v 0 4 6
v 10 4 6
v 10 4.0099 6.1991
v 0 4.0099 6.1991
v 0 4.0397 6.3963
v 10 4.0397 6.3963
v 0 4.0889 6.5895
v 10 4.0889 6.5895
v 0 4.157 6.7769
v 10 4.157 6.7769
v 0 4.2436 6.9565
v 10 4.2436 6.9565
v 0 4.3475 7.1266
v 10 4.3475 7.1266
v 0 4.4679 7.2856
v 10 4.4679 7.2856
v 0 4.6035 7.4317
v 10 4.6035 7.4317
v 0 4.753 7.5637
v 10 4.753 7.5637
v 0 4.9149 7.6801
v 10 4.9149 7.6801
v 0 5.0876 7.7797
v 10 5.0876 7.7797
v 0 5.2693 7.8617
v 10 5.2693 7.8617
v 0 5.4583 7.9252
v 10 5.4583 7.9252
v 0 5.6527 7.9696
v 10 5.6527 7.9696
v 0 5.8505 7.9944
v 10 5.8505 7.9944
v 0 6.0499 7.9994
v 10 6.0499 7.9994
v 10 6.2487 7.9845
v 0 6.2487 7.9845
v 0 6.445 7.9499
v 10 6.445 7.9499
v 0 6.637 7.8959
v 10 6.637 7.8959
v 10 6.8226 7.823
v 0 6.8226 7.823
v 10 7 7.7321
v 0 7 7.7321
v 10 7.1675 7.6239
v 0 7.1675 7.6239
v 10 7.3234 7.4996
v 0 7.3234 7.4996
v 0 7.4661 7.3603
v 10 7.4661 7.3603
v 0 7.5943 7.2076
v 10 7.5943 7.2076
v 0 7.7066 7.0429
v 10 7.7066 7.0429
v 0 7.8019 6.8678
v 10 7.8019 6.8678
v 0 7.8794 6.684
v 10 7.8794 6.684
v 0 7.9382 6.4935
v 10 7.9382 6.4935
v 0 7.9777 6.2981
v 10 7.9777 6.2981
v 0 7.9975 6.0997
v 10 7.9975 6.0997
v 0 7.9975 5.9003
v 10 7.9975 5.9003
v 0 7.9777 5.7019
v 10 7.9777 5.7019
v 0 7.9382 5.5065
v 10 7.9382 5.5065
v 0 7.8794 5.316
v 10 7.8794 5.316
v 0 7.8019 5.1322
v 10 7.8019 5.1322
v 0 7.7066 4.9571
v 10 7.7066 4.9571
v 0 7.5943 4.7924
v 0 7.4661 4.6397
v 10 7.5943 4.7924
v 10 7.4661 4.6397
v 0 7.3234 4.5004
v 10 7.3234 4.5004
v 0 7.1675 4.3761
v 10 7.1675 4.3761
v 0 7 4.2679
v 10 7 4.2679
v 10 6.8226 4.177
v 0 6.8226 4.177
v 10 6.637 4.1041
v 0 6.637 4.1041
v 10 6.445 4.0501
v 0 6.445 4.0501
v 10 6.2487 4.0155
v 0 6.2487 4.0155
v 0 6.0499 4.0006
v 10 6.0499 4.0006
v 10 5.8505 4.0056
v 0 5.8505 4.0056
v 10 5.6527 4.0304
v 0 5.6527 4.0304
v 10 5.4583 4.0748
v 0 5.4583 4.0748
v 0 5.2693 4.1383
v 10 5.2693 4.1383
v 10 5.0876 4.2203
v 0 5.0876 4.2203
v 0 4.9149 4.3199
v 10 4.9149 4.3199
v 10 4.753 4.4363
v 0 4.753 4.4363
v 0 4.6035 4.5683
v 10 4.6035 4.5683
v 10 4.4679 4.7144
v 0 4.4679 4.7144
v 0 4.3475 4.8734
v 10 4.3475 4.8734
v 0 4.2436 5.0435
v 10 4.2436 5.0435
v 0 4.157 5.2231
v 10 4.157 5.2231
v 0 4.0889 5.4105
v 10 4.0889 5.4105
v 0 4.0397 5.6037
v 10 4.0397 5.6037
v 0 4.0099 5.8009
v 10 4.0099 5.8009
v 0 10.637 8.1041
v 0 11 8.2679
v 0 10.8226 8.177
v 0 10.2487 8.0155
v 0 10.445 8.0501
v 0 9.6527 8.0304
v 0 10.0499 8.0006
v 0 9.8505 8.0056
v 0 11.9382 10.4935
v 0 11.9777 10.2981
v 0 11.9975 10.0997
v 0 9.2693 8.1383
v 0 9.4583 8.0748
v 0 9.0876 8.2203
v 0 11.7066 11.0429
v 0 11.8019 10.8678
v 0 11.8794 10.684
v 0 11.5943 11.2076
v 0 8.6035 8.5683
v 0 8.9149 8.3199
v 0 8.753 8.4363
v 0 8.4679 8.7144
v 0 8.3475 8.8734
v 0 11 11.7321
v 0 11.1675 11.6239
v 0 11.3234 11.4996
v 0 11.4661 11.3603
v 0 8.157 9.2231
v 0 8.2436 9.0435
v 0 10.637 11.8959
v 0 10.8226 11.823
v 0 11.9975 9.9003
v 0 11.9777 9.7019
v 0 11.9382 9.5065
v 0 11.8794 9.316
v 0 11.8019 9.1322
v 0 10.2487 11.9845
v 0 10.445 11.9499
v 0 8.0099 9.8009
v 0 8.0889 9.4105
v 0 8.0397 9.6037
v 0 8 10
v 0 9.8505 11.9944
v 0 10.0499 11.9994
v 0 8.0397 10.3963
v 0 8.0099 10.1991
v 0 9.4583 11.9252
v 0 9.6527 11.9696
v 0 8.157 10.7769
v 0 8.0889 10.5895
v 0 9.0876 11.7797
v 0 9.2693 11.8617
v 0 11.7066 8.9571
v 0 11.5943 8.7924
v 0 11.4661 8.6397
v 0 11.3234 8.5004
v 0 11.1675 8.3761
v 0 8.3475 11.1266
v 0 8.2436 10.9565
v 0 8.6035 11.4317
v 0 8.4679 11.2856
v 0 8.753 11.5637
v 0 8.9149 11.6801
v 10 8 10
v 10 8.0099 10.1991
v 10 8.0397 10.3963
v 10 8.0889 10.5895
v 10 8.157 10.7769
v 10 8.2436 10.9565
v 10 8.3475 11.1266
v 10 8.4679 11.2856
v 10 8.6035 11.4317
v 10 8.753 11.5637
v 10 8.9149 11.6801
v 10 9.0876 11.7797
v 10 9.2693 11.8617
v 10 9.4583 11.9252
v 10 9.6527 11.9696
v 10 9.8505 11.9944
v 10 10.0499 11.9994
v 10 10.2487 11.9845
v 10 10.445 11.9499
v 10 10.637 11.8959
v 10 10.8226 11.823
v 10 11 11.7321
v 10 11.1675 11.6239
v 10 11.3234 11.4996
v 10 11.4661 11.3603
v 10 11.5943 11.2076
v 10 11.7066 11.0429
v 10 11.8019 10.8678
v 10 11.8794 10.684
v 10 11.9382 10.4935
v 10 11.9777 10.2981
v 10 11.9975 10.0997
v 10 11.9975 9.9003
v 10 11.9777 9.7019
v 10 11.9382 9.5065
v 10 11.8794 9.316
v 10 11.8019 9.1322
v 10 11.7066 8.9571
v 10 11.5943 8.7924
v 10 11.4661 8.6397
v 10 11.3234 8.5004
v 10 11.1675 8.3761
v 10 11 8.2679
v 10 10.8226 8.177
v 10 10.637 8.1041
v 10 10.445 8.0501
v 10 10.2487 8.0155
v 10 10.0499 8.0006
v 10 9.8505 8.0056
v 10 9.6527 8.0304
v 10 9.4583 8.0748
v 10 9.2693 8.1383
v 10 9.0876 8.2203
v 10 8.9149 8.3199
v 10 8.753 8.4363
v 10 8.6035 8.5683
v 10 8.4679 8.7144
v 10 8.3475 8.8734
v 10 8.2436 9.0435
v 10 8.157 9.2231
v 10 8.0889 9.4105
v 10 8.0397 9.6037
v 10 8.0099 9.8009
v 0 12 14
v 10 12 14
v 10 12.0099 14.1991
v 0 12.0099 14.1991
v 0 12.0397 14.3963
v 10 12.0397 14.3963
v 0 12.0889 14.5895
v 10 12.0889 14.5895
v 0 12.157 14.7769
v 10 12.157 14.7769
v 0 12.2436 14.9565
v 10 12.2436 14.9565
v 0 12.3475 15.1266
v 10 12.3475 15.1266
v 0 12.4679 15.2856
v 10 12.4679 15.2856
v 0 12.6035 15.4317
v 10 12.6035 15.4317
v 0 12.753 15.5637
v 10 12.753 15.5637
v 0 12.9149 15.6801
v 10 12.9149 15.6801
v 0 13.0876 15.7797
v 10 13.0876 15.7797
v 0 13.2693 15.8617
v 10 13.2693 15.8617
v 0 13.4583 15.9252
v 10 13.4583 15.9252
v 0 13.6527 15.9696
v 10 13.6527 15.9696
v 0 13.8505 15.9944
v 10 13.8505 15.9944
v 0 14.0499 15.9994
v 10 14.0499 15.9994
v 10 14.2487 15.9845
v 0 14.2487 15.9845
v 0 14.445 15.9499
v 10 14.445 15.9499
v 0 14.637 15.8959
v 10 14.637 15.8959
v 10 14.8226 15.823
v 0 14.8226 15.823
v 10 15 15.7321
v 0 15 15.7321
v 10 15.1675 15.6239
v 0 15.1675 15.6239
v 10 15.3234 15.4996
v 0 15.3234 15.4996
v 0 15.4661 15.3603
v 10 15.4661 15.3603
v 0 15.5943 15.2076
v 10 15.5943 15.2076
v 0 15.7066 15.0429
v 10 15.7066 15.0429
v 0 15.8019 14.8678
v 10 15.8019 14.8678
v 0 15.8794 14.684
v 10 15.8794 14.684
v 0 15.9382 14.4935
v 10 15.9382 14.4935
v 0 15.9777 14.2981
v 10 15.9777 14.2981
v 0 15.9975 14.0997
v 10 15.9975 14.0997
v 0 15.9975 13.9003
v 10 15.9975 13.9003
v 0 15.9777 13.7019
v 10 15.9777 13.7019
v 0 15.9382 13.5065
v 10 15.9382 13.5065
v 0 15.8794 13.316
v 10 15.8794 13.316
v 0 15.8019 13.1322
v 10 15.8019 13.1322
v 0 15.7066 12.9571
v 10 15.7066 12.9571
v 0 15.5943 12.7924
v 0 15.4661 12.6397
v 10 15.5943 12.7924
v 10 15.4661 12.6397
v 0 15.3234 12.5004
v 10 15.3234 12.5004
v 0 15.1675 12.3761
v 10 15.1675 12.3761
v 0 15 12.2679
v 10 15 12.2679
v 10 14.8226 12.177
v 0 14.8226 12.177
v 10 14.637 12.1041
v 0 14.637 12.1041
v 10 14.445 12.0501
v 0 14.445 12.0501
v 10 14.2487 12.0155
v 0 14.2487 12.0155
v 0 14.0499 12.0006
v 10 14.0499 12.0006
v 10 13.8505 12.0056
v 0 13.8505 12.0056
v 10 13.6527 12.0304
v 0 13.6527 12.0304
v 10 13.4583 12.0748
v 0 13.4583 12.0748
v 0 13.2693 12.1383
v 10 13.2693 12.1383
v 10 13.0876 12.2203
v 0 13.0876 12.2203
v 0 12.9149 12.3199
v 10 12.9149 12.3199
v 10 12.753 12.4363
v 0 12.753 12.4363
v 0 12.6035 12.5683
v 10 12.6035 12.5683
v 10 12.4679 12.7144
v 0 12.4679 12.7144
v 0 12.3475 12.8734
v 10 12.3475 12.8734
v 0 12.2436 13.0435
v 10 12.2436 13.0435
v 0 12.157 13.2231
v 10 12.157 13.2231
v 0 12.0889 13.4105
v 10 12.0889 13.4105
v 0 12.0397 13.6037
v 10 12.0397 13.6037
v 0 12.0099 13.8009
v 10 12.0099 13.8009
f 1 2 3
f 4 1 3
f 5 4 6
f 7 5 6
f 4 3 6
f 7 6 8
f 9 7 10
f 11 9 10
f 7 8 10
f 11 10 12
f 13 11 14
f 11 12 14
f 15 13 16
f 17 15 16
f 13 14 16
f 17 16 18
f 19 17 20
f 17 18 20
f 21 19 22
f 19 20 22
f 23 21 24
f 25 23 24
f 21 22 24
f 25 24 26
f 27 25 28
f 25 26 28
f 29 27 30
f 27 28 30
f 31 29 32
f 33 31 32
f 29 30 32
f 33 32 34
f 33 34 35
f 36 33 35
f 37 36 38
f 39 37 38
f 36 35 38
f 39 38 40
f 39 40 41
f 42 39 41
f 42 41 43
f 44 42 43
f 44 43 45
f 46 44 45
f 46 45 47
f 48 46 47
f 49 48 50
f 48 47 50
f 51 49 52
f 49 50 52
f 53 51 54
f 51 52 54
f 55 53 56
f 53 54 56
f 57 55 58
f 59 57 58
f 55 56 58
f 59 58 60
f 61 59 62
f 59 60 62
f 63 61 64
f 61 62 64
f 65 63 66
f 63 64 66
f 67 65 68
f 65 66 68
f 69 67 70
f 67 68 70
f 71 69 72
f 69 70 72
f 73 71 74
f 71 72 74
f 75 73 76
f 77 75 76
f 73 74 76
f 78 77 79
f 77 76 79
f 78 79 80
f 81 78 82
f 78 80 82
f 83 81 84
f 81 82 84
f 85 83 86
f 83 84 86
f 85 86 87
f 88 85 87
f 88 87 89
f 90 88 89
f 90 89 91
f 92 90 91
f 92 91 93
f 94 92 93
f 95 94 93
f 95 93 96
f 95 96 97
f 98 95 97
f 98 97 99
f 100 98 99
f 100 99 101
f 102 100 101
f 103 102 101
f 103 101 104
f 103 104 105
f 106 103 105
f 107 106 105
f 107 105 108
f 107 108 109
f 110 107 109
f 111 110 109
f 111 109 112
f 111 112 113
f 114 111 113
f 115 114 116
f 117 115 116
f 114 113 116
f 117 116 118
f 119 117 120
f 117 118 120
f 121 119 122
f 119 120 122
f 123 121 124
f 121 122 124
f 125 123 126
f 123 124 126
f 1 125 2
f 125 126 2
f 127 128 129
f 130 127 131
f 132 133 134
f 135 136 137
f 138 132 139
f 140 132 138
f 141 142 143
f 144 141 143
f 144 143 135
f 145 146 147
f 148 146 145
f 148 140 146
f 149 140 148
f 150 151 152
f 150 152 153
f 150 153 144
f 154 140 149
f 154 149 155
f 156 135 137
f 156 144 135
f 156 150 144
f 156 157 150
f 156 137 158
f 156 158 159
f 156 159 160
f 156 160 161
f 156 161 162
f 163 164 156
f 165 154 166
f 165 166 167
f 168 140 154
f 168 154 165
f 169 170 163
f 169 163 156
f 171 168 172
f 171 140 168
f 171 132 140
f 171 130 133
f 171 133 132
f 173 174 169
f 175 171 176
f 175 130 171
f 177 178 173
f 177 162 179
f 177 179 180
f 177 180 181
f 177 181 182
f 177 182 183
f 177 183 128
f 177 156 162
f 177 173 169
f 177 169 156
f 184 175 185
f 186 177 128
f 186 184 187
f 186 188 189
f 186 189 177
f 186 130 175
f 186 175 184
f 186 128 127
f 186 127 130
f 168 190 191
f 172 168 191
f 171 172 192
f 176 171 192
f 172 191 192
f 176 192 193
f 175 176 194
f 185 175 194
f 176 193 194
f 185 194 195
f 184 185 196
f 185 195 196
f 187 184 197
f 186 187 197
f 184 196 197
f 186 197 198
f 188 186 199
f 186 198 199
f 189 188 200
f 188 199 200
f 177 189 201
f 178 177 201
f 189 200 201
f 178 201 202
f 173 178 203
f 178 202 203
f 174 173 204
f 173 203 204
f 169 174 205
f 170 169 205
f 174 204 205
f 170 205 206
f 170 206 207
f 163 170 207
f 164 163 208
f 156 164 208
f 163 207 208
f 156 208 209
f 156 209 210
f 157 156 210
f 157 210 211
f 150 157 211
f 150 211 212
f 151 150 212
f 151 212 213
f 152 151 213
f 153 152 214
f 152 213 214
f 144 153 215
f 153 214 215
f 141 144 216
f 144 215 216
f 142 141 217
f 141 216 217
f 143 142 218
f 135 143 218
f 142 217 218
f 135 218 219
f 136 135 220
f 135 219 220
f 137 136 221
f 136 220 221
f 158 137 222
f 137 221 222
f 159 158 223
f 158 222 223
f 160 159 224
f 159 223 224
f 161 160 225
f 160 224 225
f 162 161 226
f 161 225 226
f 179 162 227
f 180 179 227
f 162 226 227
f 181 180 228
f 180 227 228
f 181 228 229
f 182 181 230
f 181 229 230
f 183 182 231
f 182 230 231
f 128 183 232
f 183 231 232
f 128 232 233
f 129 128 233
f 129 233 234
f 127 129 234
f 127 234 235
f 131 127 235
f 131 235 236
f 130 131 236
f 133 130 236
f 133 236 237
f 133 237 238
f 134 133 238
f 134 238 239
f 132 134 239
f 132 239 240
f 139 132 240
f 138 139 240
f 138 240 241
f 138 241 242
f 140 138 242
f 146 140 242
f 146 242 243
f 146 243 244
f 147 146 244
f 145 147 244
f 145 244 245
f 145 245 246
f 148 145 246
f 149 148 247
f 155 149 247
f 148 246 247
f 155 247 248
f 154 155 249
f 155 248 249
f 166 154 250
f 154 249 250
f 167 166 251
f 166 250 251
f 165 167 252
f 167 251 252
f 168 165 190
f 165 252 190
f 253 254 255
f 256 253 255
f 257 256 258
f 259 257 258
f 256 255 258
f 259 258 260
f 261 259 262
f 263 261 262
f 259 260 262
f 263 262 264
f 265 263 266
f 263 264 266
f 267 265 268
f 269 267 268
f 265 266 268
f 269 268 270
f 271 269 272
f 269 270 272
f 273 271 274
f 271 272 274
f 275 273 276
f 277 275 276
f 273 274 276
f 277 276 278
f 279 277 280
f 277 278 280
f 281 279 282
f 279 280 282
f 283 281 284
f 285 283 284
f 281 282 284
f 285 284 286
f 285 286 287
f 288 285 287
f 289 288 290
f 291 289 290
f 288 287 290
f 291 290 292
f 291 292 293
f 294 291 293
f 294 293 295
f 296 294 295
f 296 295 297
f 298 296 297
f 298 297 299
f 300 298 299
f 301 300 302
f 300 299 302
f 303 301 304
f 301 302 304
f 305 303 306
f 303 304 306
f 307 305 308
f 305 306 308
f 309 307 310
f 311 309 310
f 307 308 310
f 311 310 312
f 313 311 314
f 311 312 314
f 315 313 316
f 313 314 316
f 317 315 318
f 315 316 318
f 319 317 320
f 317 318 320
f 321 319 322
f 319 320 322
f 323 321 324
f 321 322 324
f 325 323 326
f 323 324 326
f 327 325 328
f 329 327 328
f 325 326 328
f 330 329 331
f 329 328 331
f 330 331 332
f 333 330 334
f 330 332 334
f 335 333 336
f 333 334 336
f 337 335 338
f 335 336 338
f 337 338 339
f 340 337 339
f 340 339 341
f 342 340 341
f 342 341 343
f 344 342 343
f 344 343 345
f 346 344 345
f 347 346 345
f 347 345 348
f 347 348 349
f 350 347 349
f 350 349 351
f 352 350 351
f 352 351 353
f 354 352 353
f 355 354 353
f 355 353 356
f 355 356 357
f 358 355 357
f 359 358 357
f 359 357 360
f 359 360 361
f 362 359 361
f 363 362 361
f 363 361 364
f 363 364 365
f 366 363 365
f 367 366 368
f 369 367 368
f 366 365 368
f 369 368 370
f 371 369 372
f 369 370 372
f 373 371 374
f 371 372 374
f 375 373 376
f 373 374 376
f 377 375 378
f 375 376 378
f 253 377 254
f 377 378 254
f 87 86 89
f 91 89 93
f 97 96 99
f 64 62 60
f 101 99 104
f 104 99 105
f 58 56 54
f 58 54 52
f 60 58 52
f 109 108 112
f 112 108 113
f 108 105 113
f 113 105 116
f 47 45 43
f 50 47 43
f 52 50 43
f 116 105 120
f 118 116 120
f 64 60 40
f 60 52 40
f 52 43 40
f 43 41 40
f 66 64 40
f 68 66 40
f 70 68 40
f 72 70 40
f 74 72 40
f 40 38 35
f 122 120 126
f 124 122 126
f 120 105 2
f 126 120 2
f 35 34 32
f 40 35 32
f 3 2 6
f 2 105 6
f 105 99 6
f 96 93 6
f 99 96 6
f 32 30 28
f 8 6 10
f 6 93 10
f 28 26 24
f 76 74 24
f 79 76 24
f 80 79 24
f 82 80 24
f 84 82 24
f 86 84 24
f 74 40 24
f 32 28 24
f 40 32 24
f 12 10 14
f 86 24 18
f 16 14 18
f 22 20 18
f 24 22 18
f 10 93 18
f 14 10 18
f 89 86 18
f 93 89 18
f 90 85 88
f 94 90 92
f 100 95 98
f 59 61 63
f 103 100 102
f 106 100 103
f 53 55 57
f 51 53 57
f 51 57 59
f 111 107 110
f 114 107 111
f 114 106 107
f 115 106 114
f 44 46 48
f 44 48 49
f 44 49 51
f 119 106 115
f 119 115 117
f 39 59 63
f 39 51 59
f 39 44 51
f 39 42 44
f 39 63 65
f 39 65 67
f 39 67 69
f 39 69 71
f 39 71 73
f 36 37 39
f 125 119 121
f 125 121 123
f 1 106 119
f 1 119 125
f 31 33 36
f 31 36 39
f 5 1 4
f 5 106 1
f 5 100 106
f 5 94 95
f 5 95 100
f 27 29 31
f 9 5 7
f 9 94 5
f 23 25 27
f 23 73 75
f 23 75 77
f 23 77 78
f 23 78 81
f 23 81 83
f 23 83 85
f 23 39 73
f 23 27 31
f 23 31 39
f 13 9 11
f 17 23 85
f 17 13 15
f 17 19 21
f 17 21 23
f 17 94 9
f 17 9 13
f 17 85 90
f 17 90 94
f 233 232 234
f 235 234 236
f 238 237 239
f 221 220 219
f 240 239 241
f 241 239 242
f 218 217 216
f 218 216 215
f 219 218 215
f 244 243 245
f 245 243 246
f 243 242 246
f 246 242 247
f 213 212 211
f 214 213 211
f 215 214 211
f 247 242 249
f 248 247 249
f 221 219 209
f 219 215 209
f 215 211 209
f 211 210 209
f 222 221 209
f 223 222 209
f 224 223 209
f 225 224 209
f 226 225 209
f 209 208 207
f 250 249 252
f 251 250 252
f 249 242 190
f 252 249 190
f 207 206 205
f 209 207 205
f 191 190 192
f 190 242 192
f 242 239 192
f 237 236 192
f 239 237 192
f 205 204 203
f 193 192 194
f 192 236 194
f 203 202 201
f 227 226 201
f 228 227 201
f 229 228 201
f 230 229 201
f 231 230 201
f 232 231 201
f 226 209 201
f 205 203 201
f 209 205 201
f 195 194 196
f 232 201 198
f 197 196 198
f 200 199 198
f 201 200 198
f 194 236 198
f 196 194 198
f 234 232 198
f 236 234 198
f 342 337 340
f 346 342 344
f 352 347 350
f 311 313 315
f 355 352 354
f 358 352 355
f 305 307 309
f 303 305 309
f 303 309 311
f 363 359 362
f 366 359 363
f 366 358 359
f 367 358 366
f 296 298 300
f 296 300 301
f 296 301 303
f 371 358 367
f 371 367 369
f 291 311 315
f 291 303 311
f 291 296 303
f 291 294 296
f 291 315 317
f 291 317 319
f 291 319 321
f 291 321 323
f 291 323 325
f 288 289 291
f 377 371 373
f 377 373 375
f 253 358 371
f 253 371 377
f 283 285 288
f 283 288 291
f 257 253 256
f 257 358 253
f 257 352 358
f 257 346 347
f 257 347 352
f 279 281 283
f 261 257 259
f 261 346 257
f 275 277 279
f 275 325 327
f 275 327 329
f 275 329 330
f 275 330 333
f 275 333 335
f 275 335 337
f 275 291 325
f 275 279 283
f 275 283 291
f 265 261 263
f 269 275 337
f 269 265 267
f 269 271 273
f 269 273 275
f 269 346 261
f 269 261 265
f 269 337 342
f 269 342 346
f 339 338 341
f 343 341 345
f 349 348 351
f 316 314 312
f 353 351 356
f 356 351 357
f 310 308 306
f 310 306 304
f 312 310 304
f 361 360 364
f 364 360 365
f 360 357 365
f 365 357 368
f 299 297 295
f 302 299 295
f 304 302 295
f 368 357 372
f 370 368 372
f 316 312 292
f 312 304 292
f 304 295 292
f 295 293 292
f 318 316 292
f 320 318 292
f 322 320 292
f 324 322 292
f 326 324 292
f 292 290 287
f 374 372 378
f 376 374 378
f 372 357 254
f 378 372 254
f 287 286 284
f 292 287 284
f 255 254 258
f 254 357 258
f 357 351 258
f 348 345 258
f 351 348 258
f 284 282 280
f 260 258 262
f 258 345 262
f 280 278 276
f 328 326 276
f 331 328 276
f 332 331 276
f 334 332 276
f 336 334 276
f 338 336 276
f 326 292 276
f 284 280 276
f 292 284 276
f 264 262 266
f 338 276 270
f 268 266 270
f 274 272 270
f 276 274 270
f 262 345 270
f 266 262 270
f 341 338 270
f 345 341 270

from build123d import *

# Parameters (mm, degrees)
CYLINDER006_R     = 2
CYLINDER006_DEPTH = 10
CYLINDER005_R     = 2
CYLINDER005_DEPTH = 10
CYLINDER007_R     = 2
CYLINDER007_DEPTH = 10


with BuildPart() as cilindre006:
    # Cylinder006 → Cylinder006 (new body)
    with BuildSketch(Plane(origin=(10, 14, 14), x_dir=(0, -1, 0), z_dir=(-1, 0, 0))):
        Circle(CYLINDER006_R)
    extrude(amount=CYLINDER006_DEPTH)


with BuildPart() as fusion001:
    # Cylinder005 → Cylinder005 (new body)
    with BuildSketch(Plane(origin=(10, 10, 10), x_dir=(0, -1, 0), z_dir=(-1, 0, 0))):
        Circle(CYLINDER005_R)
    extrude(amount=CYLINDER005_DEPTH)

    # Fusion001: union Cilindre006
    add(cilindre006.part)


with BuildPart() as fusion002:
    # Cylinder007 → Cylinder007 (new body)
    with BuildSketch(Plane(origin=(10, 6, 6), x_dir=(0, -1, 0), z_dir=(-1, 0, 0))):
        Circle(CYLINDER007_R)
    extrude(amount=CYLINDER007_DEPTH)

    # Fusion002: union Fusion001
    add(fusion001.part)


solid = fusion002.part
